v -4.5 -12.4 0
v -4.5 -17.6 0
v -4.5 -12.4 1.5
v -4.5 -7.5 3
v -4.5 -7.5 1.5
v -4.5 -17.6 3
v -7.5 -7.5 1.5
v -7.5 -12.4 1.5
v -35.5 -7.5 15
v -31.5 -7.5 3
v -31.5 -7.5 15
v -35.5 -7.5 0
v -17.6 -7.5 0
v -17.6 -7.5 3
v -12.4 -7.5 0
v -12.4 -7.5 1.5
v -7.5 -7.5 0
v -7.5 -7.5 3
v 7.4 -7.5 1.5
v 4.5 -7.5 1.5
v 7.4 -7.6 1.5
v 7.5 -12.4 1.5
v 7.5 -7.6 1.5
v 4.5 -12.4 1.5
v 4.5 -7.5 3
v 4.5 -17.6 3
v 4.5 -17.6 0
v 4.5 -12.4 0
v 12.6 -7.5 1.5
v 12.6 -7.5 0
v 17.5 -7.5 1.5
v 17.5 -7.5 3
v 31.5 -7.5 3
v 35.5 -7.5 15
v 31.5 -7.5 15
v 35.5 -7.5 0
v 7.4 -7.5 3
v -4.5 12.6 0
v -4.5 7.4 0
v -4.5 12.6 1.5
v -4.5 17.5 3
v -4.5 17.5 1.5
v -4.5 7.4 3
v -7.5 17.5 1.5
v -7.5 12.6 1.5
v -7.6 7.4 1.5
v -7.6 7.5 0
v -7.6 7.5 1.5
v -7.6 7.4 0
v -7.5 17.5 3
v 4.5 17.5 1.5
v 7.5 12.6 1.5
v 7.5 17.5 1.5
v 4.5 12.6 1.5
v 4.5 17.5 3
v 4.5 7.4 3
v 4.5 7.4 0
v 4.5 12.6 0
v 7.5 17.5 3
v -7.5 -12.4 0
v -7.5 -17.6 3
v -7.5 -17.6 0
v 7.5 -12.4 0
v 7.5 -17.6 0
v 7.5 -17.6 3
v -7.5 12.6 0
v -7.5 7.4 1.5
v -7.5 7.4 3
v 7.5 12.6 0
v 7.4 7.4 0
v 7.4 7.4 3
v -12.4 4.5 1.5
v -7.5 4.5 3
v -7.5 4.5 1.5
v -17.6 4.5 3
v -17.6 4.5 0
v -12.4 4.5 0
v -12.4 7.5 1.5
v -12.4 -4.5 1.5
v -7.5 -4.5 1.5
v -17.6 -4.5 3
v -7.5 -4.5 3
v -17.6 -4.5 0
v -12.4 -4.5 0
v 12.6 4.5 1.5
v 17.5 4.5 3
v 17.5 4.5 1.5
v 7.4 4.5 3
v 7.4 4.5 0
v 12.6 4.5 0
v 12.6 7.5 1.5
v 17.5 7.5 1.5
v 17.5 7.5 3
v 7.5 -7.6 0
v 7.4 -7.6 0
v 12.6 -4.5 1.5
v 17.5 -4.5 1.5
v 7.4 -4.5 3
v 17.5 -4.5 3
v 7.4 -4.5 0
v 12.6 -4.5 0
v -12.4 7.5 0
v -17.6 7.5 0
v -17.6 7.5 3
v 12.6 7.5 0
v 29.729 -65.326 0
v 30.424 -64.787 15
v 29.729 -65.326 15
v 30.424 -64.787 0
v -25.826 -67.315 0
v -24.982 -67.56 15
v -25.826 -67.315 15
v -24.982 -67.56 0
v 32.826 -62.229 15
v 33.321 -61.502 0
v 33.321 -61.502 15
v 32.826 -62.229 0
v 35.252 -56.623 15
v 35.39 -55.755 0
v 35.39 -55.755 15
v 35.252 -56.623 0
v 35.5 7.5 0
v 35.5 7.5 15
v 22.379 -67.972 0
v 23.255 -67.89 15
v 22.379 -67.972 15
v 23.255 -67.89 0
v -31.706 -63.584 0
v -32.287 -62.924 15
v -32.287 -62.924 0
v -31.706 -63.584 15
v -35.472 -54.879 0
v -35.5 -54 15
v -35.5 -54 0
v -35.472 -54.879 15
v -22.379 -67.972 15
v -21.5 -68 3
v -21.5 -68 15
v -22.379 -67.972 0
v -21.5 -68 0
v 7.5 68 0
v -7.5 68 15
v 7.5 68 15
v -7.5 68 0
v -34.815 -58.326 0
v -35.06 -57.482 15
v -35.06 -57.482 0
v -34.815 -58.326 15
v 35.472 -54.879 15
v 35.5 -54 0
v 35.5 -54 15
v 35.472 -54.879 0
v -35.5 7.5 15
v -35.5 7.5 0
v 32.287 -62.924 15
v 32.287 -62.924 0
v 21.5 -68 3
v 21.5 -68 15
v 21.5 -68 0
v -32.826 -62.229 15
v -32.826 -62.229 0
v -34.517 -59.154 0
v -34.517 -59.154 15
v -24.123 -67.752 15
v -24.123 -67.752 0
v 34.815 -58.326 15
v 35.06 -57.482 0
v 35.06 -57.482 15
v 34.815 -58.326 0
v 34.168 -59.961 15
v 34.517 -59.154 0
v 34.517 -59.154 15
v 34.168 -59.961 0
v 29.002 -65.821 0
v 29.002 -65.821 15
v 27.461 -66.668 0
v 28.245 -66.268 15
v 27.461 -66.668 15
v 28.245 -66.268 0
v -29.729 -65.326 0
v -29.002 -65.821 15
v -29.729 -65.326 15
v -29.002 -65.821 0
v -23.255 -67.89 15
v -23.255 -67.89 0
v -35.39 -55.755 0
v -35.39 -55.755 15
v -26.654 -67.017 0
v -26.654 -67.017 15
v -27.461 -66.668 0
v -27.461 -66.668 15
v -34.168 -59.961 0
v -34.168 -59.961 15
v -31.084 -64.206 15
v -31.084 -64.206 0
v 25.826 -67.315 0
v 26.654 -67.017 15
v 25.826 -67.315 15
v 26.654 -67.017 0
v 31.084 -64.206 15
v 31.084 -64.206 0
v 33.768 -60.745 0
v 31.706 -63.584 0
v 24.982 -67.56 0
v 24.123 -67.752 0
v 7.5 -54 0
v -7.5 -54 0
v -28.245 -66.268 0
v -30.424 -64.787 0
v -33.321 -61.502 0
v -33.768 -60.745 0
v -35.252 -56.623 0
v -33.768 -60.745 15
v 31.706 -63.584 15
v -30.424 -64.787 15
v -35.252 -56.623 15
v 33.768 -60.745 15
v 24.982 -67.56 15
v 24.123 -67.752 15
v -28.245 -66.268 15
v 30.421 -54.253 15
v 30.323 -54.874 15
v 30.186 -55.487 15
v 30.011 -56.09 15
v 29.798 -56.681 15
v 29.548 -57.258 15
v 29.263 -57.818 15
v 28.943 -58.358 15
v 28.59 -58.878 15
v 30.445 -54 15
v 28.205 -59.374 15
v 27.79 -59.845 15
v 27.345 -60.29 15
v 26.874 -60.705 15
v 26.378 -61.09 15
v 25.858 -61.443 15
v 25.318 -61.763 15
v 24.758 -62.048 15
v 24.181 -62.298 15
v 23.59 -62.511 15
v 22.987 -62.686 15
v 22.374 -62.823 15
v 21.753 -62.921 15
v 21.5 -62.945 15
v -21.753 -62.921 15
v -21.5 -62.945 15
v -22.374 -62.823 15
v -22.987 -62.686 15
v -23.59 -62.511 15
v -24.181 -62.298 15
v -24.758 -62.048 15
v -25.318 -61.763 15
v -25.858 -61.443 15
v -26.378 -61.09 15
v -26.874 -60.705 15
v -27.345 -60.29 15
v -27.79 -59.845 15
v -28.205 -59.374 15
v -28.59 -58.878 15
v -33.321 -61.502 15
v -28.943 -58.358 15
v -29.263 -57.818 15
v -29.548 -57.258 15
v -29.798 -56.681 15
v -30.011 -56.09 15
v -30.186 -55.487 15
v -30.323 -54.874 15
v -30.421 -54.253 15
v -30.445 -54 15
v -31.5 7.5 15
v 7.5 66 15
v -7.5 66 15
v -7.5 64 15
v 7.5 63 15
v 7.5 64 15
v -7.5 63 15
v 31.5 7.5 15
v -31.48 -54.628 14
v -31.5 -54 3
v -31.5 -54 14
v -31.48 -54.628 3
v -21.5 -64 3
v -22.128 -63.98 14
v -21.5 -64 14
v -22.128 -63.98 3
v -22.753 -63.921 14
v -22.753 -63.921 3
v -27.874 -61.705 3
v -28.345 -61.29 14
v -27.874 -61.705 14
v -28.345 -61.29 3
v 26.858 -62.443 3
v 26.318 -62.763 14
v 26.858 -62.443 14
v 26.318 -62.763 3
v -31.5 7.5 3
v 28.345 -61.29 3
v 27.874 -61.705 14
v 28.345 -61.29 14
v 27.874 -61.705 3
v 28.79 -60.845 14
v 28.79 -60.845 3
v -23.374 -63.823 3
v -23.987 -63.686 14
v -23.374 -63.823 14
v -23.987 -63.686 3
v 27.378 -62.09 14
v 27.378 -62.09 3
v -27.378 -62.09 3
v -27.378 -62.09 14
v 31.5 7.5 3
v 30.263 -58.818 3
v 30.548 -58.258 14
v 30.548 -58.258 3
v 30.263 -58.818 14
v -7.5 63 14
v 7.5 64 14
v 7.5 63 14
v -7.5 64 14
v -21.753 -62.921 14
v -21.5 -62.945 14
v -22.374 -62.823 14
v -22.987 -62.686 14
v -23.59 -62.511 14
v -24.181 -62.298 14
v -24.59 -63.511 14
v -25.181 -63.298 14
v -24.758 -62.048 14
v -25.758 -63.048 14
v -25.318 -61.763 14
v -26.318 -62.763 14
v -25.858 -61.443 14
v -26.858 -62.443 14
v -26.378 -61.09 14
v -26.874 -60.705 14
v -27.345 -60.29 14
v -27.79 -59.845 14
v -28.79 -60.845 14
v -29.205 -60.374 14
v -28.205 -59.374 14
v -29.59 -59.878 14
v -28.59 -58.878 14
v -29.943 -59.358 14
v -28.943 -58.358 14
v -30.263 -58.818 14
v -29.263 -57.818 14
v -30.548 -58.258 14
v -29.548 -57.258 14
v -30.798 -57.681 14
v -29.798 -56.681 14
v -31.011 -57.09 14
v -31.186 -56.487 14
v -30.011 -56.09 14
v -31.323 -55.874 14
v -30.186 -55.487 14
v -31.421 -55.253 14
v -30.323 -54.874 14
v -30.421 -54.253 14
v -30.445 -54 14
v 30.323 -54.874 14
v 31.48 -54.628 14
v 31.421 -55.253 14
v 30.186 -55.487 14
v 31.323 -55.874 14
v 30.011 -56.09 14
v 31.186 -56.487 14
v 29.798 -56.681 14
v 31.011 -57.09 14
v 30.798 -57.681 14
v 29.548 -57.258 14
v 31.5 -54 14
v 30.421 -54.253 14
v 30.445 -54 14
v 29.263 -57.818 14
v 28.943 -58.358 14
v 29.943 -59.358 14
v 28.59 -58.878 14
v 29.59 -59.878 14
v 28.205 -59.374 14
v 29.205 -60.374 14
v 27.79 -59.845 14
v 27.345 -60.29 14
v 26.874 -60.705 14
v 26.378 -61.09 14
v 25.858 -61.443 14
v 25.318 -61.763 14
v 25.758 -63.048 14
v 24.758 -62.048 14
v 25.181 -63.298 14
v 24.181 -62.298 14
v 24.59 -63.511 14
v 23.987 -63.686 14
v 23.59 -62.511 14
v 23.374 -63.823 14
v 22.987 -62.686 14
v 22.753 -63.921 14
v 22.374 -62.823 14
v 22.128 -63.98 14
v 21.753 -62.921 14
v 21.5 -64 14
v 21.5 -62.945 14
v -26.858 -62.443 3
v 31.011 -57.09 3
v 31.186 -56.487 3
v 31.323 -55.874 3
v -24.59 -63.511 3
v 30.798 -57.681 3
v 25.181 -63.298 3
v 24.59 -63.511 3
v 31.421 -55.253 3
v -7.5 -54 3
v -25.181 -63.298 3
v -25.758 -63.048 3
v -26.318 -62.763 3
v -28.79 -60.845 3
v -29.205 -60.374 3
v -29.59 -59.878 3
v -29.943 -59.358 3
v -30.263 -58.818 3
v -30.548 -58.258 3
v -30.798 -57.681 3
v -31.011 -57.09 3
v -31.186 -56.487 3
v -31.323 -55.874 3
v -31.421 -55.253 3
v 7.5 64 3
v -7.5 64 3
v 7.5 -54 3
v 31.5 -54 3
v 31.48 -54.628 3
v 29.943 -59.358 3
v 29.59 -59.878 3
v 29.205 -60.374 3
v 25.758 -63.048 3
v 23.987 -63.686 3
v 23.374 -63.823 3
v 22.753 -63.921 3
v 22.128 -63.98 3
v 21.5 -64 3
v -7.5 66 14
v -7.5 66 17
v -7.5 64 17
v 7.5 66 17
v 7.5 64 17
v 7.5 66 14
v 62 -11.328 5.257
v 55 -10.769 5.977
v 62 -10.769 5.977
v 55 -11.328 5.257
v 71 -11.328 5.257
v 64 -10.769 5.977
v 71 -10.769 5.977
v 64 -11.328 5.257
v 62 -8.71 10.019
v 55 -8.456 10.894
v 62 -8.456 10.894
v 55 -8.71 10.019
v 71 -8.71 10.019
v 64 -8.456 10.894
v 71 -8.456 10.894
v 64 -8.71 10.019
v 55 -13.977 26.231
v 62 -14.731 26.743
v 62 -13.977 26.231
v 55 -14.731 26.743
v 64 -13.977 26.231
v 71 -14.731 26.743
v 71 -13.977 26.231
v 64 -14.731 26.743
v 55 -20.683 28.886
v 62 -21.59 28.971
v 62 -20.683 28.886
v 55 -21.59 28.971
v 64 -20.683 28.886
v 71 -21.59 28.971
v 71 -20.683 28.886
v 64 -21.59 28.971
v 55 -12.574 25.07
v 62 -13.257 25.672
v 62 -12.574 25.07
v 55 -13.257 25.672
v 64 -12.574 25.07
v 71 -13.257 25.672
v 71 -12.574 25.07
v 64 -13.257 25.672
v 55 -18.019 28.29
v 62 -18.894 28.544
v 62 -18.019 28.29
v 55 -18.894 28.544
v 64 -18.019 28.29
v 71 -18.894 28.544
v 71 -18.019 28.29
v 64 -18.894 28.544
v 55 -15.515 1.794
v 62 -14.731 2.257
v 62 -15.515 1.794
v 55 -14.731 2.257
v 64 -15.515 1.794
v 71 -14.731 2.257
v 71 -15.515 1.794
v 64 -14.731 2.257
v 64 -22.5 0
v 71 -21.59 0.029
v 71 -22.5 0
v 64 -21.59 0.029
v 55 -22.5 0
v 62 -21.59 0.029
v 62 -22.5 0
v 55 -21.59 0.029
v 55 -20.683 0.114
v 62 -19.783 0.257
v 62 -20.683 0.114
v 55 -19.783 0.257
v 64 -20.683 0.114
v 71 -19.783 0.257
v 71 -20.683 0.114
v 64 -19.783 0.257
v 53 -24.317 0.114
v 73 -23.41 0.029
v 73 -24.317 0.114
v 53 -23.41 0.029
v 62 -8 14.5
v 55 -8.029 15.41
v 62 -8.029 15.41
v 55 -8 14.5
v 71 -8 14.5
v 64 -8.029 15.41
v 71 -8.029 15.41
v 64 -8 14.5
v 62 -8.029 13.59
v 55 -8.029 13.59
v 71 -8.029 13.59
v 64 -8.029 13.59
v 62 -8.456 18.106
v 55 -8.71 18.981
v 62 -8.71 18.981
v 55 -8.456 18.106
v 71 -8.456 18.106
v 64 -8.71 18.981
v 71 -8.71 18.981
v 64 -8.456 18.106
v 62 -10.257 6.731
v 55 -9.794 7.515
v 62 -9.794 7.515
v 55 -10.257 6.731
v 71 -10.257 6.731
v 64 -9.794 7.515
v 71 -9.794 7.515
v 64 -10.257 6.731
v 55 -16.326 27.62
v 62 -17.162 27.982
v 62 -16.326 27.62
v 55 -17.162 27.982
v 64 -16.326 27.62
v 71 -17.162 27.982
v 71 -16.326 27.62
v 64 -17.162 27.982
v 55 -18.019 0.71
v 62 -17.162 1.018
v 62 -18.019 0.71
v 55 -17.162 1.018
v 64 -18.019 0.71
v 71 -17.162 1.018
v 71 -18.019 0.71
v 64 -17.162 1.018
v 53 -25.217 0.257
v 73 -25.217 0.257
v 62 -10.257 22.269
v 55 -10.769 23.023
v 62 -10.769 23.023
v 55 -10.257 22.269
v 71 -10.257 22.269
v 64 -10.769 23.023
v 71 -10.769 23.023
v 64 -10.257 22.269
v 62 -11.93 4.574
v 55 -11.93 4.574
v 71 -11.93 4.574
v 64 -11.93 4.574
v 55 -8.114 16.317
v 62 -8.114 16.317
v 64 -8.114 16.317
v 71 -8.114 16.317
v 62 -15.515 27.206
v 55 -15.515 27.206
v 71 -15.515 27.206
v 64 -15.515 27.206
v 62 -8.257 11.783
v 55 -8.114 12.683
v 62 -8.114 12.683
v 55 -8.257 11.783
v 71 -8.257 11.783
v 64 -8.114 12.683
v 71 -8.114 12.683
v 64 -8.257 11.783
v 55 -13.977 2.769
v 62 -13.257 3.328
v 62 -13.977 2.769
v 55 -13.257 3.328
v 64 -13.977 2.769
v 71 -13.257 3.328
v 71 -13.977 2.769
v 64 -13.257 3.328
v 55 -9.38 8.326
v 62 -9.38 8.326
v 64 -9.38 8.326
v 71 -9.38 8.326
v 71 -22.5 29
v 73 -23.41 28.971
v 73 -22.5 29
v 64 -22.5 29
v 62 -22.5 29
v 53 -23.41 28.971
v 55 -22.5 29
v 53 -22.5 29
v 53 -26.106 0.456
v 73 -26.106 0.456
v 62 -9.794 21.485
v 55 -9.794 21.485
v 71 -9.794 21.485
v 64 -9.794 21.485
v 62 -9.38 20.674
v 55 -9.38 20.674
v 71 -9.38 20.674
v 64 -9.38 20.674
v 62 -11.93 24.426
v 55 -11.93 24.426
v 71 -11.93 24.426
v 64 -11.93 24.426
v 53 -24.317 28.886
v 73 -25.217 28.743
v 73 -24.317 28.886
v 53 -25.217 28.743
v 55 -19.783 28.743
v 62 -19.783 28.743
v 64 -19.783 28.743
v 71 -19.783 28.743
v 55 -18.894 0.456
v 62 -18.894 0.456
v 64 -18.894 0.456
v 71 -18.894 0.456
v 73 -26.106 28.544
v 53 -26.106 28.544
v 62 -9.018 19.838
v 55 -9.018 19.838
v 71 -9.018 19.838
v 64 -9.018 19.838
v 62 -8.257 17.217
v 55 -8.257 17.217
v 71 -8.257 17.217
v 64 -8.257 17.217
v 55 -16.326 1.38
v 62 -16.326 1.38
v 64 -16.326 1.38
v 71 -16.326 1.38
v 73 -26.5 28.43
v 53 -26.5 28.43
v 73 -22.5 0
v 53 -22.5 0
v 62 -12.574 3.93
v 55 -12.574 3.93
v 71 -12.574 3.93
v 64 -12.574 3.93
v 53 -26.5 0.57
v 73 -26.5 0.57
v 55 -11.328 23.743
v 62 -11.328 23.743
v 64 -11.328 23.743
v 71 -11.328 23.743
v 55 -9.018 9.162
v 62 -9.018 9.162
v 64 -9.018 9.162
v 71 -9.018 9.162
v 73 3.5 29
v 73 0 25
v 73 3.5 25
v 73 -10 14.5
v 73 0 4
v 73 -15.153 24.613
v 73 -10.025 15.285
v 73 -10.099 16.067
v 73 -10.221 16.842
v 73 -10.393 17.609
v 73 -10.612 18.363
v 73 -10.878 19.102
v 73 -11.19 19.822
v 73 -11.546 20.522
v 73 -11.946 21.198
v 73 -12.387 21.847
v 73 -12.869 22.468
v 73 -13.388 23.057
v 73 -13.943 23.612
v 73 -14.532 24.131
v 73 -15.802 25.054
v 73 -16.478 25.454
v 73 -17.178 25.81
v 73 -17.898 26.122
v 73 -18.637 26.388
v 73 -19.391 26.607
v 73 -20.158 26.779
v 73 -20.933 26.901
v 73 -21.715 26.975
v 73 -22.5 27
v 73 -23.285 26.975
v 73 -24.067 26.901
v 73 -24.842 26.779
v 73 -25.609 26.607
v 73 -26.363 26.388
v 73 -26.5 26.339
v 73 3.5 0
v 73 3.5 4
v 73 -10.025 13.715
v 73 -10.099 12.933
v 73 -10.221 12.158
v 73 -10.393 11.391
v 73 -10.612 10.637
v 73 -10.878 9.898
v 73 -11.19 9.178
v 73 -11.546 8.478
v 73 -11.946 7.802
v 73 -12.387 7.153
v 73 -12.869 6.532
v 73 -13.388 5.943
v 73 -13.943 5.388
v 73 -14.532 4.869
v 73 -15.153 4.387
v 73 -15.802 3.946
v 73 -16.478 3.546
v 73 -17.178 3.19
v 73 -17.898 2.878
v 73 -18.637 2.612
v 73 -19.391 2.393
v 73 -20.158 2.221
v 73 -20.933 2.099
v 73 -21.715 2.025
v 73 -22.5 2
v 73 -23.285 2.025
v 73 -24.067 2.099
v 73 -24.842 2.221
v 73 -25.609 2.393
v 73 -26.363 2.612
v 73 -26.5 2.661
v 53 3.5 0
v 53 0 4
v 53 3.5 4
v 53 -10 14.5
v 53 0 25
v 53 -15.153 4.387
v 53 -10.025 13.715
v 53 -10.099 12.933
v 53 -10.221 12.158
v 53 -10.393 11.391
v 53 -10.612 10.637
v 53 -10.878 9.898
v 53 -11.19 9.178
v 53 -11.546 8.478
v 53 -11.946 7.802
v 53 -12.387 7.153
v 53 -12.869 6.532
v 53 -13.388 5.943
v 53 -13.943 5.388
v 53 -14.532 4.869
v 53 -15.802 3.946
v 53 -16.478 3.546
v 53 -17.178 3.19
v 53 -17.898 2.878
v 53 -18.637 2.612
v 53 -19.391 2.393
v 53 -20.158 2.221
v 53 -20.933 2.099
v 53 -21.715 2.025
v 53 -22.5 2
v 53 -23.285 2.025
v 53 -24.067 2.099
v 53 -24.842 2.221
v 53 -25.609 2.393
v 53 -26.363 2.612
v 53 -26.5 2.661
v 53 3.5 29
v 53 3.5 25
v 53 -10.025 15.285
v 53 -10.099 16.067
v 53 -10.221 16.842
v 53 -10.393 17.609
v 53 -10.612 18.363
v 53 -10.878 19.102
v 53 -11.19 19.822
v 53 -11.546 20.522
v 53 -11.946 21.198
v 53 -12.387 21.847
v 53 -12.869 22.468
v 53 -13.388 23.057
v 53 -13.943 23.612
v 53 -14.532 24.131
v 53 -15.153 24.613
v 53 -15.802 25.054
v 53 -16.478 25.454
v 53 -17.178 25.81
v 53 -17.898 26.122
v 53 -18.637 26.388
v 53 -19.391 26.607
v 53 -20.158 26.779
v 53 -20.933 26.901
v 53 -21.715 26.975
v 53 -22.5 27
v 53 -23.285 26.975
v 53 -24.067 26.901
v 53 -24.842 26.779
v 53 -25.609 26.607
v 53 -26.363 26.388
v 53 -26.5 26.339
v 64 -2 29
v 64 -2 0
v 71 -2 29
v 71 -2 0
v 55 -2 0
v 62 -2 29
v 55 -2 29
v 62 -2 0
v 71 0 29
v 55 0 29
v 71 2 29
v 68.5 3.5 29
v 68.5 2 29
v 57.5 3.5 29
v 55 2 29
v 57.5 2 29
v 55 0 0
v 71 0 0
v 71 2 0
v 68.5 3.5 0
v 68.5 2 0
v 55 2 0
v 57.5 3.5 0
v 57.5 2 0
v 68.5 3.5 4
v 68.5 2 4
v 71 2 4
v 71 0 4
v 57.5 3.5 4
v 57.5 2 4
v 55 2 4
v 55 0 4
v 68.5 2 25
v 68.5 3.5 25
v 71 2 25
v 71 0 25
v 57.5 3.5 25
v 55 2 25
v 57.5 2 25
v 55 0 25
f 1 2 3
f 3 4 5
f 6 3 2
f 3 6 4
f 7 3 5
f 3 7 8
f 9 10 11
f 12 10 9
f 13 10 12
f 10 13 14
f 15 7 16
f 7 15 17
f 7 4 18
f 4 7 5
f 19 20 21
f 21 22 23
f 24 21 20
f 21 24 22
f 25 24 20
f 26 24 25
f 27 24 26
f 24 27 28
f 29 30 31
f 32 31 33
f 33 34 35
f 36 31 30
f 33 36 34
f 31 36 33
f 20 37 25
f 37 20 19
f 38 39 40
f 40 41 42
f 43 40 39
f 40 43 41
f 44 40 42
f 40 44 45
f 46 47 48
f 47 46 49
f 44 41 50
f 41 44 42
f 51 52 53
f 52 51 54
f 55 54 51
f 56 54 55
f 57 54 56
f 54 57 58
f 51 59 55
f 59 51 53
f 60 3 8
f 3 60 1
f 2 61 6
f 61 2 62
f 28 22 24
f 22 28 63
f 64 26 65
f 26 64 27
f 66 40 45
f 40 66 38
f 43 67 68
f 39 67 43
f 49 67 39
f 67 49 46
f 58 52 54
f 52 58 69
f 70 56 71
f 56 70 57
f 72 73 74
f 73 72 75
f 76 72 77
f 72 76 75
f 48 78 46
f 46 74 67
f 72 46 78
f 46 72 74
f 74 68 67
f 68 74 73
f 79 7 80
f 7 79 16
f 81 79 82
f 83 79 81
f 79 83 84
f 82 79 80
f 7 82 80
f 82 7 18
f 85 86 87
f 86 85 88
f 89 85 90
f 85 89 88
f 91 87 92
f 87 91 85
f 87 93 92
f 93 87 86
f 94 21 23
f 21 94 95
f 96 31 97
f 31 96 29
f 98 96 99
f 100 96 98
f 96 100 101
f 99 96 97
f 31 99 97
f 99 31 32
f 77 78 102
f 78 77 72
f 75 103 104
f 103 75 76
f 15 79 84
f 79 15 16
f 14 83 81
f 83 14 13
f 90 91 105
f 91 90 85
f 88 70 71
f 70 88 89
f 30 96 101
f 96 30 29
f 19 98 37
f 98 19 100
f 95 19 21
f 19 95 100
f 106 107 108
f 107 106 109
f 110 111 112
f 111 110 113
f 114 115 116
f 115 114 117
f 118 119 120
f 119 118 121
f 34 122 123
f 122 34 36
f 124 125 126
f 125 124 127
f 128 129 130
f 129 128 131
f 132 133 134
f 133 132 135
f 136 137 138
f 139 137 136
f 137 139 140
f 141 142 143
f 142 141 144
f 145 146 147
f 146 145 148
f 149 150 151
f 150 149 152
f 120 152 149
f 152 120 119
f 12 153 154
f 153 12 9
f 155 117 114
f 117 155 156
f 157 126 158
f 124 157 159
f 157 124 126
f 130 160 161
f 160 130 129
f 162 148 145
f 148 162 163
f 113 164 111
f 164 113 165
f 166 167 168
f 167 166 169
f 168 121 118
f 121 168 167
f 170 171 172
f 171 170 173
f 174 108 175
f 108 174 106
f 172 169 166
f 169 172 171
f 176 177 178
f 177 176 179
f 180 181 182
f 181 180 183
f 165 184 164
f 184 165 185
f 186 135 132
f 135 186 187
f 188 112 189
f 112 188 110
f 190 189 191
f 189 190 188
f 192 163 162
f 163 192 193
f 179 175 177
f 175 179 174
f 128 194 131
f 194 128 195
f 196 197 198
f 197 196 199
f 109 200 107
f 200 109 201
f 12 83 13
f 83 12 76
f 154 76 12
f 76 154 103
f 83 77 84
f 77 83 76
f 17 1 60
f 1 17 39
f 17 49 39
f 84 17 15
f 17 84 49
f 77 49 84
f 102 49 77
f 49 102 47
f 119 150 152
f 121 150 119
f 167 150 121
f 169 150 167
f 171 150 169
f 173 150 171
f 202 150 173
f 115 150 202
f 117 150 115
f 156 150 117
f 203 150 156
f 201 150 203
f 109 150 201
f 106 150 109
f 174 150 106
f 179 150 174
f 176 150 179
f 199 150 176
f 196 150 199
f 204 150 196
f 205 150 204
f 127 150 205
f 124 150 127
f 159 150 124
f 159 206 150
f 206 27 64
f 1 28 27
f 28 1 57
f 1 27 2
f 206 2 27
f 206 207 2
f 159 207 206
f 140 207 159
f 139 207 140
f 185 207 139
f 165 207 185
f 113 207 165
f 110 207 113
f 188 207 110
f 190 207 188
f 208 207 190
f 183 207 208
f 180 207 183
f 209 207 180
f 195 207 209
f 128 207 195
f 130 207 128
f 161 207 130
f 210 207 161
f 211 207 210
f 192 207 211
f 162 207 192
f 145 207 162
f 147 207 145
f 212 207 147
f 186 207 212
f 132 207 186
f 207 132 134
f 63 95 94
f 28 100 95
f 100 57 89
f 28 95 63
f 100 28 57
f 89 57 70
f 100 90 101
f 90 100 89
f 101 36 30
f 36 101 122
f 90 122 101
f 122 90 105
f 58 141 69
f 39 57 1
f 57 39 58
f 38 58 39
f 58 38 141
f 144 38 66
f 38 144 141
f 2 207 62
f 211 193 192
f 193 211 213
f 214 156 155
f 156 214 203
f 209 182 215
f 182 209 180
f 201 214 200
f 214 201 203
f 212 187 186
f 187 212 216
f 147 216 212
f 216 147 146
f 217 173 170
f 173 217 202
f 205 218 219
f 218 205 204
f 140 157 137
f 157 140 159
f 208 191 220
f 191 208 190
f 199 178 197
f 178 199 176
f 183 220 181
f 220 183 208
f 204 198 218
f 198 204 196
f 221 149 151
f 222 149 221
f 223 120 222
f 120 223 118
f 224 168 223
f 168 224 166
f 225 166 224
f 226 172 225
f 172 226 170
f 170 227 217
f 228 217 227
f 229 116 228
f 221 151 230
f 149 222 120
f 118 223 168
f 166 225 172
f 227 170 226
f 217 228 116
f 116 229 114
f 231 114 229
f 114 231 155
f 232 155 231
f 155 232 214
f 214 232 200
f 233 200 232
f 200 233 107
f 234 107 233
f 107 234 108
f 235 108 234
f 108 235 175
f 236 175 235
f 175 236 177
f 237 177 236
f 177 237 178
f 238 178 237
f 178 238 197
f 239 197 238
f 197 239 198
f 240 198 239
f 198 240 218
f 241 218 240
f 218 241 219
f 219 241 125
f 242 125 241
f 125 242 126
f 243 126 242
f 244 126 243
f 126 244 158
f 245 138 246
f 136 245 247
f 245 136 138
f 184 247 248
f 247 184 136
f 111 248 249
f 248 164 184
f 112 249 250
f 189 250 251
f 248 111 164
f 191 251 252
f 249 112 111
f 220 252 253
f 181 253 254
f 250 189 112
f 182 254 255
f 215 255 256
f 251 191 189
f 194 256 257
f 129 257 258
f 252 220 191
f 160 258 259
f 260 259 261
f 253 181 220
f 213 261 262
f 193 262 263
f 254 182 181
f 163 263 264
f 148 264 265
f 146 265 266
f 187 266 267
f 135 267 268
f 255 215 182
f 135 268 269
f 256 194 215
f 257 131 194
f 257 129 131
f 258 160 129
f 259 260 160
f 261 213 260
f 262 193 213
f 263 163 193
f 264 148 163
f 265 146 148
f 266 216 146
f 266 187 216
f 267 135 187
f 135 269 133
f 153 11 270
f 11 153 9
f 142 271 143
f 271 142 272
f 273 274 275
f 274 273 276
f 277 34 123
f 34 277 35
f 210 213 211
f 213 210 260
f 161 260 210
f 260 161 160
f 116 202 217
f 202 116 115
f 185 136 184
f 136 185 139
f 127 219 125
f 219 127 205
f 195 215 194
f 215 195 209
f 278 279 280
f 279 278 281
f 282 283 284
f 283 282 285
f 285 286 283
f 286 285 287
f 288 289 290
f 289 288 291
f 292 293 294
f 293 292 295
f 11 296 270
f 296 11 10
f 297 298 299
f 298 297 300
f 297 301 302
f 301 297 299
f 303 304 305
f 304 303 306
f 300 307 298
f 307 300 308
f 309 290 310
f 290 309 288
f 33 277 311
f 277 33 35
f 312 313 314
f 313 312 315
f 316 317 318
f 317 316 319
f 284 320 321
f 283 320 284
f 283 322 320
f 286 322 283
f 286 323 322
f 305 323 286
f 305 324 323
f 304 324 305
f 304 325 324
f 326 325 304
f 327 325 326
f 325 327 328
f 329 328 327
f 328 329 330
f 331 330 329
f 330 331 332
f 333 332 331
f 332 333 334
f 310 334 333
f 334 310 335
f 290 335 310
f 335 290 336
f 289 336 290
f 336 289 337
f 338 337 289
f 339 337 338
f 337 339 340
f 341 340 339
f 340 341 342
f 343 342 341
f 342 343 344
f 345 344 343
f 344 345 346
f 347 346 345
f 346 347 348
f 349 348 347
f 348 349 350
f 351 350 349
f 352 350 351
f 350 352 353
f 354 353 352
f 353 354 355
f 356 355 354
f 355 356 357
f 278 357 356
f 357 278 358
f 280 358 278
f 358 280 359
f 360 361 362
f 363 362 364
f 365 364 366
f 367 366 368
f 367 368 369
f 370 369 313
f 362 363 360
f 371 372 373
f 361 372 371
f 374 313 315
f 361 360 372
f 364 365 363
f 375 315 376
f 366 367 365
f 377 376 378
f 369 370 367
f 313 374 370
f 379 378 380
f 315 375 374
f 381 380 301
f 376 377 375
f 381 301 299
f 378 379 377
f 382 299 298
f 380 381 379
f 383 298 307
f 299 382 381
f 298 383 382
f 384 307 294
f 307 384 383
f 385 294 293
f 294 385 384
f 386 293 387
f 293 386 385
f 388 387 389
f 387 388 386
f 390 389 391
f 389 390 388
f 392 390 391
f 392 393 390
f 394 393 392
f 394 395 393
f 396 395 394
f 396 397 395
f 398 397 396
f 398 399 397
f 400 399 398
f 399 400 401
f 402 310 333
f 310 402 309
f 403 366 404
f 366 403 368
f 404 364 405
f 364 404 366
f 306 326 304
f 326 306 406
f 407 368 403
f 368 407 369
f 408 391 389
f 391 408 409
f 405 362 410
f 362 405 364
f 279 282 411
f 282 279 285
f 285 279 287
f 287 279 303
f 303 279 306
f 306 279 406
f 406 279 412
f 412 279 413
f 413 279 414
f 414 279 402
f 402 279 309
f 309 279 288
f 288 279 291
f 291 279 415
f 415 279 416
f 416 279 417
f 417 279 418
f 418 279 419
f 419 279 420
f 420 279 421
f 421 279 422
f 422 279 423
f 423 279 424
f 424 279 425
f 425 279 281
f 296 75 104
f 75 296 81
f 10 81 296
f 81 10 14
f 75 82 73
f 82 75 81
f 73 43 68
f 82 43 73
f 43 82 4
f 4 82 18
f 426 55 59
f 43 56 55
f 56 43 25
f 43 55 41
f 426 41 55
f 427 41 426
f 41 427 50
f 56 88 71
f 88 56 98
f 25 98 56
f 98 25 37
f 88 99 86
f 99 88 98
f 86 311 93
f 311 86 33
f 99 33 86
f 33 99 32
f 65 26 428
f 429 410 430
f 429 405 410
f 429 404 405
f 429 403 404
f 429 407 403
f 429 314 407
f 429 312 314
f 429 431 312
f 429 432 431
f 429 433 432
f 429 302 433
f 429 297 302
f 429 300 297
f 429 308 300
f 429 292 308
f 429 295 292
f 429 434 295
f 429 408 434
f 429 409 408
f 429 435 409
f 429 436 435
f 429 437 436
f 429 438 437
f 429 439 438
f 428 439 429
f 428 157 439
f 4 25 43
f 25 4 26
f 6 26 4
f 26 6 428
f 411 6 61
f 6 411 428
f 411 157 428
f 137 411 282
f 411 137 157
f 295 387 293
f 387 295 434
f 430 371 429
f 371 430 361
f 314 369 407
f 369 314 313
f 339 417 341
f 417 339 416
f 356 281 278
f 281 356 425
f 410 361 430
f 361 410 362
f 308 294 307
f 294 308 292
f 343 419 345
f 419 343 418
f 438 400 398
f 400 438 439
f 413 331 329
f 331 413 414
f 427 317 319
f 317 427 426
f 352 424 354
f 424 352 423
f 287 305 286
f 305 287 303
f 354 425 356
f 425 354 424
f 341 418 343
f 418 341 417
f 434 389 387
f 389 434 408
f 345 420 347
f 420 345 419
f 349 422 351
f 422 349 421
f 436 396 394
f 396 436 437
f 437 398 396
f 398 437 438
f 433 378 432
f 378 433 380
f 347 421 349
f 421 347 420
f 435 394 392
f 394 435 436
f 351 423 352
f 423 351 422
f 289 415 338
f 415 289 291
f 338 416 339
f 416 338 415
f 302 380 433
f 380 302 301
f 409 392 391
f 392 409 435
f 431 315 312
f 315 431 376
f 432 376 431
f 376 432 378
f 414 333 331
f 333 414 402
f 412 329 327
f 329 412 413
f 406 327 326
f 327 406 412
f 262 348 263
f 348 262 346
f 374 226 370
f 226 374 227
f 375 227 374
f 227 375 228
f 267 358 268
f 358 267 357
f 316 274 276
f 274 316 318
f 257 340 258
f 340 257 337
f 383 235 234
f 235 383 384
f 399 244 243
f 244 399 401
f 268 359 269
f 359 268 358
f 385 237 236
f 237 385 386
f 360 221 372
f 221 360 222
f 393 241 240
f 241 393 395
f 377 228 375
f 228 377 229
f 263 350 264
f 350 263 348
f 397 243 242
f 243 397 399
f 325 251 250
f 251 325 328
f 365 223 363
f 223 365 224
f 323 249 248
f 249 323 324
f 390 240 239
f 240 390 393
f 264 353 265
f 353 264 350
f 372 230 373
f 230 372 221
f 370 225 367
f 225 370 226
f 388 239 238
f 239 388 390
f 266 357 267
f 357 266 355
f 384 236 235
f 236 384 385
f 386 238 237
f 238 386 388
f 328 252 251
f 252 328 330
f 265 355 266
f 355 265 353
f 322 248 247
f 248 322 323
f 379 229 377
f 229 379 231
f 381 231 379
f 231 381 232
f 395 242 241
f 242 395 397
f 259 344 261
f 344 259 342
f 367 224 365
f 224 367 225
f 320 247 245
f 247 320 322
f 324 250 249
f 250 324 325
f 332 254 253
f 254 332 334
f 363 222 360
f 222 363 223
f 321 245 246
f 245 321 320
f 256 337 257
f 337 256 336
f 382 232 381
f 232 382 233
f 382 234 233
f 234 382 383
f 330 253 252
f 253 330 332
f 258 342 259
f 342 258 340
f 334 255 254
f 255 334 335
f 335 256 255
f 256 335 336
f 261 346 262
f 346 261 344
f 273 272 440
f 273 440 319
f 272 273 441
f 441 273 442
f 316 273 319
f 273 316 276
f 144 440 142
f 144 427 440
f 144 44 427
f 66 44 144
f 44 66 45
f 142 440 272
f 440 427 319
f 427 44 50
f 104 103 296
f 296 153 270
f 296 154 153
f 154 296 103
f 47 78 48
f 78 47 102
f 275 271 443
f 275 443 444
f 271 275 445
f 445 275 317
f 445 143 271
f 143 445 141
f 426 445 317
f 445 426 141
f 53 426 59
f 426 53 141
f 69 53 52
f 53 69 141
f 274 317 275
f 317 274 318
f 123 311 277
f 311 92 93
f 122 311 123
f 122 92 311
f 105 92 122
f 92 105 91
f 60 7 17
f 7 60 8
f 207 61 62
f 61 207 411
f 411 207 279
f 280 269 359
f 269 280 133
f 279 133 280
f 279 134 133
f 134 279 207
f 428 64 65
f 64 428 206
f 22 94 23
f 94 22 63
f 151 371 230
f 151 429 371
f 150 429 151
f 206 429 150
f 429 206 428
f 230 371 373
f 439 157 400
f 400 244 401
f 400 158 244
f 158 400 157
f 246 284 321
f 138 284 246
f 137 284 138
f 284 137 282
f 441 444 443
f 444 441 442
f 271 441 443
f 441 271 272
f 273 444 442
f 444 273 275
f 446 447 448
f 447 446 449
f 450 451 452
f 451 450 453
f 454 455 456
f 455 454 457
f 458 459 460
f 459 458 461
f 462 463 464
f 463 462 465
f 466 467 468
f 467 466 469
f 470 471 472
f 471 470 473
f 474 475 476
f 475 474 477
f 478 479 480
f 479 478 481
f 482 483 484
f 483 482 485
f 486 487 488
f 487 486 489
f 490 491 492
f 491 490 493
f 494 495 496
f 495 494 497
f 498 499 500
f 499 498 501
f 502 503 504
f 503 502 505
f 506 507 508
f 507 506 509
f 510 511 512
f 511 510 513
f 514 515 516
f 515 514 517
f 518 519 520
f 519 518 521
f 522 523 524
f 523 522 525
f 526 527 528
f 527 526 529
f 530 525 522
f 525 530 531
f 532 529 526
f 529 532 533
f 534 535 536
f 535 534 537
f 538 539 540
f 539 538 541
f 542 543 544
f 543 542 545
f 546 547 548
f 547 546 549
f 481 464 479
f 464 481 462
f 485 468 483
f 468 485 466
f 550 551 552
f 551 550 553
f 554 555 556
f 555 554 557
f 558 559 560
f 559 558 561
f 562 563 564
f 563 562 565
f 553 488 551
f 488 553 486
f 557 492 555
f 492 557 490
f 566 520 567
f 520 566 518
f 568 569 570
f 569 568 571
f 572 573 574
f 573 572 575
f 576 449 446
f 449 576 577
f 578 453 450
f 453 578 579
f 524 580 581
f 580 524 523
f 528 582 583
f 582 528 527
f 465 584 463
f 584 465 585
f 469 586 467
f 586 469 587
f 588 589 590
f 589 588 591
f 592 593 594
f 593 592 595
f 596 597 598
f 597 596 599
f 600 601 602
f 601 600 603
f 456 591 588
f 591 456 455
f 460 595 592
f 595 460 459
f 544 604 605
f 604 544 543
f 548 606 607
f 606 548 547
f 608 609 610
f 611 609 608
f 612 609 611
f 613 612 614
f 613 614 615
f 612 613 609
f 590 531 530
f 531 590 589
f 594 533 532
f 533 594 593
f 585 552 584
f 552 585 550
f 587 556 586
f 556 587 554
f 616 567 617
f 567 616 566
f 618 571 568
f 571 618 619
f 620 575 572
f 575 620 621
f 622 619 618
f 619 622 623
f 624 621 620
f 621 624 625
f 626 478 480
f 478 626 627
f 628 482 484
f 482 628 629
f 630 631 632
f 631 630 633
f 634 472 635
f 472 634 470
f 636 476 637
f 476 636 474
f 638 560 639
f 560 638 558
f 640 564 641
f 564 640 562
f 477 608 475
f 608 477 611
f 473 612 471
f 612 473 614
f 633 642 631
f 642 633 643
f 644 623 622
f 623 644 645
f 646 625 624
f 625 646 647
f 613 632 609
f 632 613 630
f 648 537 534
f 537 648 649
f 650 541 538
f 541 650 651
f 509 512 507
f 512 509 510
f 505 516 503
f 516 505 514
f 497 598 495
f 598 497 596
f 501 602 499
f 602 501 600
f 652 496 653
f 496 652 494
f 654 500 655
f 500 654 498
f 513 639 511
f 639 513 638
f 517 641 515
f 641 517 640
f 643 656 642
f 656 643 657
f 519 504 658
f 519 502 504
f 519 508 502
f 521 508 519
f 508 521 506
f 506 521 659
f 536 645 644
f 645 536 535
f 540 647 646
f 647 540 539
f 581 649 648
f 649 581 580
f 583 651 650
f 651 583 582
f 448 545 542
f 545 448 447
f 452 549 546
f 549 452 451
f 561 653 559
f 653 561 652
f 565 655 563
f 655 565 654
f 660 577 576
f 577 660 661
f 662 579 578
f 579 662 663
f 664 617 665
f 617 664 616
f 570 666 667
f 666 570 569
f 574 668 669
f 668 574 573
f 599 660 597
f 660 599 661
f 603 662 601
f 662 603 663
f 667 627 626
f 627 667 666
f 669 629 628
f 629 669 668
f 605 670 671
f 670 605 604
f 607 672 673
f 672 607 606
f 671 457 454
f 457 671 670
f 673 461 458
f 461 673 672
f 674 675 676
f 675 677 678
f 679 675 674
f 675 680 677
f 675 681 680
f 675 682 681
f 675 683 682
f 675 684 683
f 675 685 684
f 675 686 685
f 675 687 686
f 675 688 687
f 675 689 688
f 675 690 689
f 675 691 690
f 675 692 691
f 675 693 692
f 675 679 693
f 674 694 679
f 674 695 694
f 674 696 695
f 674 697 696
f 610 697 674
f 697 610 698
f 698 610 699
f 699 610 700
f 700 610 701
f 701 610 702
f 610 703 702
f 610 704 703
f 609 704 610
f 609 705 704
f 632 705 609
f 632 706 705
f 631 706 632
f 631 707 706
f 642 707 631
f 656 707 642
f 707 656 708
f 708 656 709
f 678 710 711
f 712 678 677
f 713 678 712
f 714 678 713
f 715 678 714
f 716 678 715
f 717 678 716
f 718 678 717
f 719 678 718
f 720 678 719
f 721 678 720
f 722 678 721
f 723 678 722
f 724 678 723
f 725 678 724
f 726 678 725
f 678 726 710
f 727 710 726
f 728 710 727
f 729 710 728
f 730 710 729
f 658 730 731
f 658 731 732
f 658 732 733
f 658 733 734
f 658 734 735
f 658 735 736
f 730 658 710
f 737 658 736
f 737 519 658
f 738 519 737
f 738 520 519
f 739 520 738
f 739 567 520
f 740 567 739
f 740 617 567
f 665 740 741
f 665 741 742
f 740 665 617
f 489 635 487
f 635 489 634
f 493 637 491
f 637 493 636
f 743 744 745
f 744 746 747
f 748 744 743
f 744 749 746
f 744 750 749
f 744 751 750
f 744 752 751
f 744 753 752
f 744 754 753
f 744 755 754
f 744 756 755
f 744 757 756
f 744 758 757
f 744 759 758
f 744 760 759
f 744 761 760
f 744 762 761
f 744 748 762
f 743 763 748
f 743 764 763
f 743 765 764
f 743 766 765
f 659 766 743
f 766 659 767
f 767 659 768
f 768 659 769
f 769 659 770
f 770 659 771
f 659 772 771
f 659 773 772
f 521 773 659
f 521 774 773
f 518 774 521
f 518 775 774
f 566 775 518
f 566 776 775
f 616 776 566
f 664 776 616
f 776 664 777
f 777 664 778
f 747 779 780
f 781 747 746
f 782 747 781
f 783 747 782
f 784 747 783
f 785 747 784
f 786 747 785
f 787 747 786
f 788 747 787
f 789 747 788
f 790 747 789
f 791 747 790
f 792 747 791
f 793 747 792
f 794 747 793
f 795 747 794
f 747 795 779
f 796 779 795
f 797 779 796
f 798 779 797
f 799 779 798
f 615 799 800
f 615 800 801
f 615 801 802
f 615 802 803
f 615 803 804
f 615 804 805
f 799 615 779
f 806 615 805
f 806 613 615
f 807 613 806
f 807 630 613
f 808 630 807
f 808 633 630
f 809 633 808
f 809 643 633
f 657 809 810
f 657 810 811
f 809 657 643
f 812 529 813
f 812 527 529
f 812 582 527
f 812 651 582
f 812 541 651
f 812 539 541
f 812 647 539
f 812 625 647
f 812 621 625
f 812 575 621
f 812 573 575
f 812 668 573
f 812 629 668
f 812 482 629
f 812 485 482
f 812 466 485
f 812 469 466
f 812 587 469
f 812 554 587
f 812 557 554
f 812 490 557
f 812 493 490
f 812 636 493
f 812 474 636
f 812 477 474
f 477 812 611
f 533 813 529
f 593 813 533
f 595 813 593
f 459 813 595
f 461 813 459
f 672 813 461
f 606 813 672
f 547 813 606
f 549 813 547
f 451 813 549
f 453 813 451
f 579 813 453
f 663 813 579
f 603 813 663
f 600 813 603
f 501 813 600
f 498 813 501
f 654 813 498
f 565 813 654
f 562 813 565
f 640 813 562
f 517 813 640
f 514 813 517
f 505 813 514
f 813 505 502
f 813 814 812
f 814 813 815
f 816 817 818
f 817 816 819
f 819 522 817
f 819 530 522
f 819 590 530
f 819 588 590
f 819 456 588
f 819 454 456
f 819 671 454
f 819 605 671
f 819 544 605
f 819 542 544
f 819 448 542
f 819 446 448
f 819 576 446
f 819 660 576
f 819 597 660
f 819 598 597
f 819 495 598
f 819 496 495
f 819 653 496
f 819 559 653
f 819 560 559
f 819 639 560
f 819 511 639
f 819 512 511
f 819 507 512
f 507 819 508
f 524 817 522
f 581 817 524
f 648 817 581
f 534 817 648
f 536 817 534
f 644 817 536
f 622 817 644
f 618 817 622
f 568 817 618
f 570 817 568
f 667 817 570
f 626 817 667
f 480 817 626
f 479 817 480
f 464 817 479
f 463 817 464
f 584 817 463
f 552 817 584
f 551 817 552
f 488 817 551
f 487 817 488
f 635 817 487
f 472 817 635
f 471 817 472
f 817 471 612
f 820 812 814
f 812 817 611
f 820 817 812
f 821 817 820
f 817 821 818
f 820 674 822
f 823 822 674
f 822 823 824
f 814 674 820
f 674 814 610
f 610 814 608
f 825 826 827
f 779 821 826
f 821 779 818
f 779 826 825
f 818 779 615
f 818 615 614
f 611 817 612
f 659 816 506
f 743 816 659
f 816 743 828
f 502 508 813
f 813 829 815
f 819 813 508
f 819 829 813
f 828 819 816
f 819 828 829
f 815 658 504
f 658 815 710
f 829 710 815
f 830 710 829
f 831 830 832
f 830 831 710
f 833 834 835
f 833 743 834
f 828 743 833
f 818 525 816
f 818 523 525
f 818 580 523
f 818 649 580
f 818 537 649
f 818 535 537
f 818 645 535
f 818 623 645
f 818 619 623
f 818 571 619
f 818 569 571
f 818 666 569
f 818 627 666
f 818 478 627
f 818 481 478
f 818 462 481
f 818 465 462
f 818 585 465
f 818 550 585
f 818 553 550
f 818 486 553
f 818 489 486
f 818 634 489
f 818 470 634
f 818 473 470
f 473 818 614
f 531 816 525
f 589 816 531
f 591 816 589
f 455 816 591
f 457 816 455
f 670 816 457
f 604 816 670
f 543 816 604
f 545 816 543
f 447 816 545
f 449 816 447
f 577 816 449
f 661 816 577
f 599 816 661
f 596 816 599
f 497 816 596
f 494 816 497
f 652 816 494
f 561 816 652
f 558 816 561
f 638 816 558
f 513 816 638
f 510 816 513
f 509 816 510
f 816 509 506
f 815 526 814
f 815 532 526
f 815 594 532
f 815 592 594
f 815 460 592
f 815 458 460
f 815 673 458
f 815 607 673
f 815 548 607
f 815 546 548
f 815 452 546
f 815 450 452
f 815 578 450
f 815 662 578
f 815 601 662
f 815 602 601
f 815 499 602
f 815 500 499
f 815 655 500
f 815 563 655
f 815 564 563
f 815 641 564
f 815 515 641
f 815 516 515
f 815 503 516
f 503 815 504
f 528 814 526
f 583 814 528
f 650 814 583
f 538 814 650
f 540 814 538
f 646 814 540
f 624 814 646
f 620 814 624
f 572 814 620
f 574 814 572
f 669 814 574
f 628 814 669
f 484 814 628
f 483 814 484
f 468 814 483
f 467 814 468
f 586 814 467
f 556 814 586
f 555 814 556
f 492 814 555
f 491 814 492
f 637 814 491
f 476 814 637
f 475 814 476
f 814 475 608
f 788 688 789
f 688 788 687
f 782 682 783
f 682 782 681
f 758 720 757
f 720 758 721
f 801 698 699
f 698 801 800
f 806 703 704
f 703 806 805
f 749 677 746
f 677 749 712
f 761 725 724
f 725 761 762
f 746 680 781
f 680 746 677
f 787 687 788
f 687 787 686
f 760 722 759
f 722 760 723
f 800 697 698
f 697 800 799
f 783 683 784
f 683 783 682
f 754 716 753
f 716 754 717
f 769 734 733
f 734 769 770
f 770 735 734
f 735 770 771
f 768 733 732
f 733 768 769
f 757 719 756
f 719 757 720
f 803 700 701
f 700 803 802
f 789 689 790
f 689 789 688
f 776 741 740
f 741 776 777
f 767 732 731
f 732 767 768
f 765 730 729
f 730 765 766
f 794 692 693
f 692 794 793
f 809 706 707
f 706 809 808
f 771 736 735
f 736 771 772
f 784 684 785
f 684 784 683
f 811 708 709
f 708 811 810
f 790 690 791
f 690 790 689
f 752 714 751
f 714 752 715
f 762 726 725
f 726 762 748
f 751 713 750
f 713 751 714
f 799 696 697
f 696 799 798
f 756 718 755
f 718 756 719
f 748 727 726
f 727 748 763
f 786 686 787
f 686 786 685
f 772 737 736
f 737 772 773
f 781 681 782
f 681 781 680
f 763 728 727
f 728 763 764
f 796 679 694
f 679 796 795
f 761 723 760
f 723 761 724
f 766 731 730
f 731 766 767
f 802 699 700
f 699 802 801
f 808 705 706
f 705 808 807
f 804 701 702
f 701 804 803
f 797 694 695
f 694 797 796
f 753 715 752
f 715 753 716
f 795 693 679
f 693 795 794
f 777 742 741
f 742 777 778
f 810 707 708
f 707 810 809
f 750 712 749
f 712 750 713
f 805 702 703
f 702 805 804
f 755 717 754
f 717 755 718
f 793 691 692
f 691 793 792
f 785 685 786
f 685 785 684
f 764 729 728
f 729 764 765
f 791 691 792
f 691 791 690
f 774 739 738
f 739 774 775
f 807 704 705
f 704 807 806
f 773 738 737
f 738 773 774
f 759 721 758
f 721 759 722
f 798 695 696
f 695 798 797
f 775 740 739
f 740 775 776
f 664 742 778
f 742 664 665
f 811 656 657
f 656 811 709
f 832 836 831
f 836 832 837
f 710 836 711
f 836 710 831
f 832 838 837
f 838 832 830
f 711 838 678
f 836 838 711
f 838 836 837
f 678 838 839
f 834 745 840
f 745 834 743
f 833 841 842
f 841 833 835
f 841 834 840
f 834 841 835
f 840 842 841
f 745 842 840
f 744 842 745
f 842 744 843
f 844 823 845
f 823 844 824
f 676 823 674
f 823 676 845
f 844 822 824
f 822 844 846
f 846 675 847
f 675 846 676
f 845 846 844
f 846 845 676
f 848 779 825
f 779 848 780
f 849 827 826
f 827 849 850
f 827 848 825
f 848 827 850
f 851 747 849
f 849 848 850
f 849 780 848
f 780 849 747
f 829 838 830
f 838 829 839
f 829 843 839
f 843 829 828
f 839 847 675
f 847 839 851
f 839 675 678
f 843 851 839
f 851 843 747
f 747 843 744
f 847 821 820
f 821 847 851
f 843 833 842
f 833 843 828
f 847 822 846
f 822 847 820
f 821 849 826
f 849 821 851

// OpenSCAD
// The outer width (from left to right without buttons) of the phone or bumper in millimeters
width = 63;
// Outer with of the wall
wallwidth = 4;
// The outer length (from top to bottom without buttons) of the phone or bumper in millimeters
length = 128;
// The outer height (from backside to front side) of the phone or bumper in millimeters
height = 11;
// The width of the bridges from top to bottom and from left to right in millimeters. Lower values save material, higher values make the mount more stable. 15 millimeter is a good choice.
bridgewidth = 15;
// The radius of the corners of the phone or bumper. The standard Apple bumper for iPhone 5 has a corner radius of 10 millimeter.
cornerradius = 10;
// The distance bwtween the iPhone holder and the bike's tube in millimeter. Make it larger when you have other obstacles mounted on the bike.
mountheight = 10;
// The diameter of the tube where to mount the holder in millimeters.
tubediameter = 25;
// The fininess of the cylinders. 100 is a good start.
$fn = 100;

module connector(stegwidth) {
	// plates
	translate([-stegwidth/2-2.5,-stegwidth/2-4.5,2]) cube([4.5,4,1.5]);
	translate([stegwidth/2-2,-stegwidth/2-4.5,2]) cube([4.5,4,1.5]);
	translate([-stegwidth/2-2.5,stegwidth/2+5.5,2]) cube([4.5,4,1.5]);
	translate([stegwidth/2-2,stegwidth/2+5.5,2]) cube([4.5,4,1.5]);
	// pins
	translate([-stegwidth/2-2.5,-stegwidth/2-4.5,0]) cube([2,4,2]);
	translate([stegwidth/2+0.5,-stegwidth/2-4.5,0]) cube([2,4,2]);
	translate([-stegwidth/2-2.5,stegwidth/2+5.5,0]) cube([2,4,2]);
	translate([stegwidth/2+0.5,stegwidth/2+5.5,0]) cube([2,4,2]);
}

module connectorcutout(stegwidth) {
		translate([-stegwidth/2-0.1,-stegwidth/2-5,1.5]) cube([3.1,5,1.6]);
		translate([stegwidth/2-3,-stegwidth/2-5,1.5]) cube([3.1,5,1.6]);
		translate([-stegwidth/2-0.1,stegwidth/2+5,1.5]) cube([3.1,5,1.6]);
		translate([stegwidth/2-3,stegwidth/2+5,1.5]) cube([3.1,5,1.6]);
		translate([-stegwidth/2-0.1,-stegwidth/2-10.1,-0.1]) cube([3.1,5.2,3.2]);
		translate([stegwidth/2-3,-stegwidth/2-10.1,-0.1]) cube([3.1,5.2,3.2]);
		translate([-stegwidth/2-0.1,stegwidth/2-0.1,-0.1]) cube([3.1,5.2,3.2]);
		translate([stegwidth/2-3,stegwidth/2-0.1,-0.1]) cube([3.1,5.2,3.2]);
}

module case(width, height, depth, radius, stegwidth) {
	difference() {
		// Outer hull
		hull() {
			translate([-width/2+radius, -height/2+radius, 0]) cylinder(r=radius+wallwidth, h=depth+4);
			translate([-width/2+radius, +height/2-radius, 0]) cylinder(r=radius+wallwidth, h=depth+4);
			translate([+width/2-radius, -height/2+radius, 0]) cylinder(r=radius+wallwidth, h=depth+4);
			translate([+width/2-radius, +height/2-radius, 0]) cylinder(r=radius+wallwidth, h=depth+4);
		}
		// substract iPhone itself
		hull() {
			translate([-width/2+radius, -height/2+radius, 3]) cylinder(r=radius, h=depth);
			translate([-width/2+radius, +height/2-radius, 3]) cylinder(r=radius, h=depth);
			translate([+width/2-radius, -height/2+radius, 3]) cylinder(r=radius, h=depth);
			translate([+width/2-radius, +height/2-radius, 3]) cylinder(r=radius, h=depth);
		}
		// display
		hull() {
			translate([-width/2+radius+1, -height/2+radius+1, depth+2.9]) cylinder(r=radius, h=1.2);
			translate([-width/2+radius+1, +height/2-radius-1, depth+2.9]) cylinder(r=radius, h=1.2);
			translate([+width/2-radius-1, -height/2+radius+1, depth+2.9]) cylinder(r=radius, h=1.2);
			translate([+width/2-radius-1, +height/2-radius-1, depth+2.9]) cylinder(r=radius, h=1.2);
		}
		// left and right pins
		translate([-width/2,-stegwidth/2-0.1,depth+2.9]) cube([width,stegwidth+0.2,1.2]);
		// upper left corner
		translate([-width/2-wallwidth-.1, +stegwidth/2, -0.1]) cube([width/2-stegwidth/2+wallwidth+.1,height/2+wallwidth,depth+2*wallwidth+.2]);
		// upper right corner
		translate([+stegwidth/2, +stegwidth/2, -0.1]) cube([width/2-stegwidth/2+wallwidth+.1,height/2+wallwidth,depth+2*wallwidth+.2]);
		// lower left cut
		translate([-width/2-wallwidth-.1, -height/2+radius, -0.1]) cube([width/2-stegwidth/2+wallwidth+.1,height/2-stegwidth/2-radius,depth+2*wallwidth+.2]);
		// lower right cut
		translate([+stegwidth/2, -height/2+radius, -0.1]) cube([width/2-stegwidth/2+wallwidth+.1,height/2-stegwidth/2-radius,depth+2*wallwidth+.2]);
		// lower connectors cut
		translate([-width/2+radius, -height/2-wallwidth-.1, 3]) cube([width-radius-radius,wallwidth+1.2,depth+2*wallwidth+.2]);
		// vertical connector cutouts
		connectorcutout(stegwidth);
		// horizontal connector cutouts
		rotate([0, 0, -90]) connectorcutout(stegwidth);
	}
	// Schnippel zum losmachen
	translate([-stegwidth/2,height/2,depth+3]) cube([stegwidth,2,3]);
}

module holder(height, radius, stegwidth) {
	// upper plate
	translate([-stegwidth/2-2.5,-stegwidth/2-7,0]) cube([stegwidth+5,stegwidth+14,2]);
	// ring
	difference() {
		union() {
			translate([-stegwidth/2-2.5,0,radius+height]) rotate([0,90,0]) cylinder(r=radius+2,h=stegwidth+5);
			// vertikale Stege
			translate([-1, -stegwidth/2-7, 2]) cube([2,stegwidth+14,radius+height-2]);
			translate([-stegwidth/2-2.5, -stegwidth/2-7, 2]) cube([2,stegwidth+14,radius+height-2]);
			translate([stegwidth/2+0.5, -stegwidth/2-7, 2]) cube([2,stegwidth+14,radius+height-2]);
		}
		translate([-stegwidth/2-2.6,0,radius+height]) rotate([0,90,0]) cylinder(r=radius,h=stegwidth+5.2);
		// lower ring cut
		translate([-stegwidth/2-2.6, -radius-2.1, radius+height+4]) cube([stegwidth+5.2,radius*2+4.2,radius+4]);
	}
	// connector
	translate([0,-2.5,0]) rotate([0, 180, 0]) connector(stegwidth);
}

case(width, length, height, cornerradius, bridgewidth);
rotate([90,0,0]) translate([width, tubediameter/2+2 > 14.5 ? tubediameter/2+2 : 14.5, 0]) holder(mountheight, tubediameter/2, bridgewidth);
//rotate([180,0,90]) translate([0, 2, 0]) holder(mountheight, tubediameter/2, bridgewidth);
//rotate([90,0,0]) translate([width, 14.5, 0]) holder(mountheight, tubediameter/2, bridgewidth);
